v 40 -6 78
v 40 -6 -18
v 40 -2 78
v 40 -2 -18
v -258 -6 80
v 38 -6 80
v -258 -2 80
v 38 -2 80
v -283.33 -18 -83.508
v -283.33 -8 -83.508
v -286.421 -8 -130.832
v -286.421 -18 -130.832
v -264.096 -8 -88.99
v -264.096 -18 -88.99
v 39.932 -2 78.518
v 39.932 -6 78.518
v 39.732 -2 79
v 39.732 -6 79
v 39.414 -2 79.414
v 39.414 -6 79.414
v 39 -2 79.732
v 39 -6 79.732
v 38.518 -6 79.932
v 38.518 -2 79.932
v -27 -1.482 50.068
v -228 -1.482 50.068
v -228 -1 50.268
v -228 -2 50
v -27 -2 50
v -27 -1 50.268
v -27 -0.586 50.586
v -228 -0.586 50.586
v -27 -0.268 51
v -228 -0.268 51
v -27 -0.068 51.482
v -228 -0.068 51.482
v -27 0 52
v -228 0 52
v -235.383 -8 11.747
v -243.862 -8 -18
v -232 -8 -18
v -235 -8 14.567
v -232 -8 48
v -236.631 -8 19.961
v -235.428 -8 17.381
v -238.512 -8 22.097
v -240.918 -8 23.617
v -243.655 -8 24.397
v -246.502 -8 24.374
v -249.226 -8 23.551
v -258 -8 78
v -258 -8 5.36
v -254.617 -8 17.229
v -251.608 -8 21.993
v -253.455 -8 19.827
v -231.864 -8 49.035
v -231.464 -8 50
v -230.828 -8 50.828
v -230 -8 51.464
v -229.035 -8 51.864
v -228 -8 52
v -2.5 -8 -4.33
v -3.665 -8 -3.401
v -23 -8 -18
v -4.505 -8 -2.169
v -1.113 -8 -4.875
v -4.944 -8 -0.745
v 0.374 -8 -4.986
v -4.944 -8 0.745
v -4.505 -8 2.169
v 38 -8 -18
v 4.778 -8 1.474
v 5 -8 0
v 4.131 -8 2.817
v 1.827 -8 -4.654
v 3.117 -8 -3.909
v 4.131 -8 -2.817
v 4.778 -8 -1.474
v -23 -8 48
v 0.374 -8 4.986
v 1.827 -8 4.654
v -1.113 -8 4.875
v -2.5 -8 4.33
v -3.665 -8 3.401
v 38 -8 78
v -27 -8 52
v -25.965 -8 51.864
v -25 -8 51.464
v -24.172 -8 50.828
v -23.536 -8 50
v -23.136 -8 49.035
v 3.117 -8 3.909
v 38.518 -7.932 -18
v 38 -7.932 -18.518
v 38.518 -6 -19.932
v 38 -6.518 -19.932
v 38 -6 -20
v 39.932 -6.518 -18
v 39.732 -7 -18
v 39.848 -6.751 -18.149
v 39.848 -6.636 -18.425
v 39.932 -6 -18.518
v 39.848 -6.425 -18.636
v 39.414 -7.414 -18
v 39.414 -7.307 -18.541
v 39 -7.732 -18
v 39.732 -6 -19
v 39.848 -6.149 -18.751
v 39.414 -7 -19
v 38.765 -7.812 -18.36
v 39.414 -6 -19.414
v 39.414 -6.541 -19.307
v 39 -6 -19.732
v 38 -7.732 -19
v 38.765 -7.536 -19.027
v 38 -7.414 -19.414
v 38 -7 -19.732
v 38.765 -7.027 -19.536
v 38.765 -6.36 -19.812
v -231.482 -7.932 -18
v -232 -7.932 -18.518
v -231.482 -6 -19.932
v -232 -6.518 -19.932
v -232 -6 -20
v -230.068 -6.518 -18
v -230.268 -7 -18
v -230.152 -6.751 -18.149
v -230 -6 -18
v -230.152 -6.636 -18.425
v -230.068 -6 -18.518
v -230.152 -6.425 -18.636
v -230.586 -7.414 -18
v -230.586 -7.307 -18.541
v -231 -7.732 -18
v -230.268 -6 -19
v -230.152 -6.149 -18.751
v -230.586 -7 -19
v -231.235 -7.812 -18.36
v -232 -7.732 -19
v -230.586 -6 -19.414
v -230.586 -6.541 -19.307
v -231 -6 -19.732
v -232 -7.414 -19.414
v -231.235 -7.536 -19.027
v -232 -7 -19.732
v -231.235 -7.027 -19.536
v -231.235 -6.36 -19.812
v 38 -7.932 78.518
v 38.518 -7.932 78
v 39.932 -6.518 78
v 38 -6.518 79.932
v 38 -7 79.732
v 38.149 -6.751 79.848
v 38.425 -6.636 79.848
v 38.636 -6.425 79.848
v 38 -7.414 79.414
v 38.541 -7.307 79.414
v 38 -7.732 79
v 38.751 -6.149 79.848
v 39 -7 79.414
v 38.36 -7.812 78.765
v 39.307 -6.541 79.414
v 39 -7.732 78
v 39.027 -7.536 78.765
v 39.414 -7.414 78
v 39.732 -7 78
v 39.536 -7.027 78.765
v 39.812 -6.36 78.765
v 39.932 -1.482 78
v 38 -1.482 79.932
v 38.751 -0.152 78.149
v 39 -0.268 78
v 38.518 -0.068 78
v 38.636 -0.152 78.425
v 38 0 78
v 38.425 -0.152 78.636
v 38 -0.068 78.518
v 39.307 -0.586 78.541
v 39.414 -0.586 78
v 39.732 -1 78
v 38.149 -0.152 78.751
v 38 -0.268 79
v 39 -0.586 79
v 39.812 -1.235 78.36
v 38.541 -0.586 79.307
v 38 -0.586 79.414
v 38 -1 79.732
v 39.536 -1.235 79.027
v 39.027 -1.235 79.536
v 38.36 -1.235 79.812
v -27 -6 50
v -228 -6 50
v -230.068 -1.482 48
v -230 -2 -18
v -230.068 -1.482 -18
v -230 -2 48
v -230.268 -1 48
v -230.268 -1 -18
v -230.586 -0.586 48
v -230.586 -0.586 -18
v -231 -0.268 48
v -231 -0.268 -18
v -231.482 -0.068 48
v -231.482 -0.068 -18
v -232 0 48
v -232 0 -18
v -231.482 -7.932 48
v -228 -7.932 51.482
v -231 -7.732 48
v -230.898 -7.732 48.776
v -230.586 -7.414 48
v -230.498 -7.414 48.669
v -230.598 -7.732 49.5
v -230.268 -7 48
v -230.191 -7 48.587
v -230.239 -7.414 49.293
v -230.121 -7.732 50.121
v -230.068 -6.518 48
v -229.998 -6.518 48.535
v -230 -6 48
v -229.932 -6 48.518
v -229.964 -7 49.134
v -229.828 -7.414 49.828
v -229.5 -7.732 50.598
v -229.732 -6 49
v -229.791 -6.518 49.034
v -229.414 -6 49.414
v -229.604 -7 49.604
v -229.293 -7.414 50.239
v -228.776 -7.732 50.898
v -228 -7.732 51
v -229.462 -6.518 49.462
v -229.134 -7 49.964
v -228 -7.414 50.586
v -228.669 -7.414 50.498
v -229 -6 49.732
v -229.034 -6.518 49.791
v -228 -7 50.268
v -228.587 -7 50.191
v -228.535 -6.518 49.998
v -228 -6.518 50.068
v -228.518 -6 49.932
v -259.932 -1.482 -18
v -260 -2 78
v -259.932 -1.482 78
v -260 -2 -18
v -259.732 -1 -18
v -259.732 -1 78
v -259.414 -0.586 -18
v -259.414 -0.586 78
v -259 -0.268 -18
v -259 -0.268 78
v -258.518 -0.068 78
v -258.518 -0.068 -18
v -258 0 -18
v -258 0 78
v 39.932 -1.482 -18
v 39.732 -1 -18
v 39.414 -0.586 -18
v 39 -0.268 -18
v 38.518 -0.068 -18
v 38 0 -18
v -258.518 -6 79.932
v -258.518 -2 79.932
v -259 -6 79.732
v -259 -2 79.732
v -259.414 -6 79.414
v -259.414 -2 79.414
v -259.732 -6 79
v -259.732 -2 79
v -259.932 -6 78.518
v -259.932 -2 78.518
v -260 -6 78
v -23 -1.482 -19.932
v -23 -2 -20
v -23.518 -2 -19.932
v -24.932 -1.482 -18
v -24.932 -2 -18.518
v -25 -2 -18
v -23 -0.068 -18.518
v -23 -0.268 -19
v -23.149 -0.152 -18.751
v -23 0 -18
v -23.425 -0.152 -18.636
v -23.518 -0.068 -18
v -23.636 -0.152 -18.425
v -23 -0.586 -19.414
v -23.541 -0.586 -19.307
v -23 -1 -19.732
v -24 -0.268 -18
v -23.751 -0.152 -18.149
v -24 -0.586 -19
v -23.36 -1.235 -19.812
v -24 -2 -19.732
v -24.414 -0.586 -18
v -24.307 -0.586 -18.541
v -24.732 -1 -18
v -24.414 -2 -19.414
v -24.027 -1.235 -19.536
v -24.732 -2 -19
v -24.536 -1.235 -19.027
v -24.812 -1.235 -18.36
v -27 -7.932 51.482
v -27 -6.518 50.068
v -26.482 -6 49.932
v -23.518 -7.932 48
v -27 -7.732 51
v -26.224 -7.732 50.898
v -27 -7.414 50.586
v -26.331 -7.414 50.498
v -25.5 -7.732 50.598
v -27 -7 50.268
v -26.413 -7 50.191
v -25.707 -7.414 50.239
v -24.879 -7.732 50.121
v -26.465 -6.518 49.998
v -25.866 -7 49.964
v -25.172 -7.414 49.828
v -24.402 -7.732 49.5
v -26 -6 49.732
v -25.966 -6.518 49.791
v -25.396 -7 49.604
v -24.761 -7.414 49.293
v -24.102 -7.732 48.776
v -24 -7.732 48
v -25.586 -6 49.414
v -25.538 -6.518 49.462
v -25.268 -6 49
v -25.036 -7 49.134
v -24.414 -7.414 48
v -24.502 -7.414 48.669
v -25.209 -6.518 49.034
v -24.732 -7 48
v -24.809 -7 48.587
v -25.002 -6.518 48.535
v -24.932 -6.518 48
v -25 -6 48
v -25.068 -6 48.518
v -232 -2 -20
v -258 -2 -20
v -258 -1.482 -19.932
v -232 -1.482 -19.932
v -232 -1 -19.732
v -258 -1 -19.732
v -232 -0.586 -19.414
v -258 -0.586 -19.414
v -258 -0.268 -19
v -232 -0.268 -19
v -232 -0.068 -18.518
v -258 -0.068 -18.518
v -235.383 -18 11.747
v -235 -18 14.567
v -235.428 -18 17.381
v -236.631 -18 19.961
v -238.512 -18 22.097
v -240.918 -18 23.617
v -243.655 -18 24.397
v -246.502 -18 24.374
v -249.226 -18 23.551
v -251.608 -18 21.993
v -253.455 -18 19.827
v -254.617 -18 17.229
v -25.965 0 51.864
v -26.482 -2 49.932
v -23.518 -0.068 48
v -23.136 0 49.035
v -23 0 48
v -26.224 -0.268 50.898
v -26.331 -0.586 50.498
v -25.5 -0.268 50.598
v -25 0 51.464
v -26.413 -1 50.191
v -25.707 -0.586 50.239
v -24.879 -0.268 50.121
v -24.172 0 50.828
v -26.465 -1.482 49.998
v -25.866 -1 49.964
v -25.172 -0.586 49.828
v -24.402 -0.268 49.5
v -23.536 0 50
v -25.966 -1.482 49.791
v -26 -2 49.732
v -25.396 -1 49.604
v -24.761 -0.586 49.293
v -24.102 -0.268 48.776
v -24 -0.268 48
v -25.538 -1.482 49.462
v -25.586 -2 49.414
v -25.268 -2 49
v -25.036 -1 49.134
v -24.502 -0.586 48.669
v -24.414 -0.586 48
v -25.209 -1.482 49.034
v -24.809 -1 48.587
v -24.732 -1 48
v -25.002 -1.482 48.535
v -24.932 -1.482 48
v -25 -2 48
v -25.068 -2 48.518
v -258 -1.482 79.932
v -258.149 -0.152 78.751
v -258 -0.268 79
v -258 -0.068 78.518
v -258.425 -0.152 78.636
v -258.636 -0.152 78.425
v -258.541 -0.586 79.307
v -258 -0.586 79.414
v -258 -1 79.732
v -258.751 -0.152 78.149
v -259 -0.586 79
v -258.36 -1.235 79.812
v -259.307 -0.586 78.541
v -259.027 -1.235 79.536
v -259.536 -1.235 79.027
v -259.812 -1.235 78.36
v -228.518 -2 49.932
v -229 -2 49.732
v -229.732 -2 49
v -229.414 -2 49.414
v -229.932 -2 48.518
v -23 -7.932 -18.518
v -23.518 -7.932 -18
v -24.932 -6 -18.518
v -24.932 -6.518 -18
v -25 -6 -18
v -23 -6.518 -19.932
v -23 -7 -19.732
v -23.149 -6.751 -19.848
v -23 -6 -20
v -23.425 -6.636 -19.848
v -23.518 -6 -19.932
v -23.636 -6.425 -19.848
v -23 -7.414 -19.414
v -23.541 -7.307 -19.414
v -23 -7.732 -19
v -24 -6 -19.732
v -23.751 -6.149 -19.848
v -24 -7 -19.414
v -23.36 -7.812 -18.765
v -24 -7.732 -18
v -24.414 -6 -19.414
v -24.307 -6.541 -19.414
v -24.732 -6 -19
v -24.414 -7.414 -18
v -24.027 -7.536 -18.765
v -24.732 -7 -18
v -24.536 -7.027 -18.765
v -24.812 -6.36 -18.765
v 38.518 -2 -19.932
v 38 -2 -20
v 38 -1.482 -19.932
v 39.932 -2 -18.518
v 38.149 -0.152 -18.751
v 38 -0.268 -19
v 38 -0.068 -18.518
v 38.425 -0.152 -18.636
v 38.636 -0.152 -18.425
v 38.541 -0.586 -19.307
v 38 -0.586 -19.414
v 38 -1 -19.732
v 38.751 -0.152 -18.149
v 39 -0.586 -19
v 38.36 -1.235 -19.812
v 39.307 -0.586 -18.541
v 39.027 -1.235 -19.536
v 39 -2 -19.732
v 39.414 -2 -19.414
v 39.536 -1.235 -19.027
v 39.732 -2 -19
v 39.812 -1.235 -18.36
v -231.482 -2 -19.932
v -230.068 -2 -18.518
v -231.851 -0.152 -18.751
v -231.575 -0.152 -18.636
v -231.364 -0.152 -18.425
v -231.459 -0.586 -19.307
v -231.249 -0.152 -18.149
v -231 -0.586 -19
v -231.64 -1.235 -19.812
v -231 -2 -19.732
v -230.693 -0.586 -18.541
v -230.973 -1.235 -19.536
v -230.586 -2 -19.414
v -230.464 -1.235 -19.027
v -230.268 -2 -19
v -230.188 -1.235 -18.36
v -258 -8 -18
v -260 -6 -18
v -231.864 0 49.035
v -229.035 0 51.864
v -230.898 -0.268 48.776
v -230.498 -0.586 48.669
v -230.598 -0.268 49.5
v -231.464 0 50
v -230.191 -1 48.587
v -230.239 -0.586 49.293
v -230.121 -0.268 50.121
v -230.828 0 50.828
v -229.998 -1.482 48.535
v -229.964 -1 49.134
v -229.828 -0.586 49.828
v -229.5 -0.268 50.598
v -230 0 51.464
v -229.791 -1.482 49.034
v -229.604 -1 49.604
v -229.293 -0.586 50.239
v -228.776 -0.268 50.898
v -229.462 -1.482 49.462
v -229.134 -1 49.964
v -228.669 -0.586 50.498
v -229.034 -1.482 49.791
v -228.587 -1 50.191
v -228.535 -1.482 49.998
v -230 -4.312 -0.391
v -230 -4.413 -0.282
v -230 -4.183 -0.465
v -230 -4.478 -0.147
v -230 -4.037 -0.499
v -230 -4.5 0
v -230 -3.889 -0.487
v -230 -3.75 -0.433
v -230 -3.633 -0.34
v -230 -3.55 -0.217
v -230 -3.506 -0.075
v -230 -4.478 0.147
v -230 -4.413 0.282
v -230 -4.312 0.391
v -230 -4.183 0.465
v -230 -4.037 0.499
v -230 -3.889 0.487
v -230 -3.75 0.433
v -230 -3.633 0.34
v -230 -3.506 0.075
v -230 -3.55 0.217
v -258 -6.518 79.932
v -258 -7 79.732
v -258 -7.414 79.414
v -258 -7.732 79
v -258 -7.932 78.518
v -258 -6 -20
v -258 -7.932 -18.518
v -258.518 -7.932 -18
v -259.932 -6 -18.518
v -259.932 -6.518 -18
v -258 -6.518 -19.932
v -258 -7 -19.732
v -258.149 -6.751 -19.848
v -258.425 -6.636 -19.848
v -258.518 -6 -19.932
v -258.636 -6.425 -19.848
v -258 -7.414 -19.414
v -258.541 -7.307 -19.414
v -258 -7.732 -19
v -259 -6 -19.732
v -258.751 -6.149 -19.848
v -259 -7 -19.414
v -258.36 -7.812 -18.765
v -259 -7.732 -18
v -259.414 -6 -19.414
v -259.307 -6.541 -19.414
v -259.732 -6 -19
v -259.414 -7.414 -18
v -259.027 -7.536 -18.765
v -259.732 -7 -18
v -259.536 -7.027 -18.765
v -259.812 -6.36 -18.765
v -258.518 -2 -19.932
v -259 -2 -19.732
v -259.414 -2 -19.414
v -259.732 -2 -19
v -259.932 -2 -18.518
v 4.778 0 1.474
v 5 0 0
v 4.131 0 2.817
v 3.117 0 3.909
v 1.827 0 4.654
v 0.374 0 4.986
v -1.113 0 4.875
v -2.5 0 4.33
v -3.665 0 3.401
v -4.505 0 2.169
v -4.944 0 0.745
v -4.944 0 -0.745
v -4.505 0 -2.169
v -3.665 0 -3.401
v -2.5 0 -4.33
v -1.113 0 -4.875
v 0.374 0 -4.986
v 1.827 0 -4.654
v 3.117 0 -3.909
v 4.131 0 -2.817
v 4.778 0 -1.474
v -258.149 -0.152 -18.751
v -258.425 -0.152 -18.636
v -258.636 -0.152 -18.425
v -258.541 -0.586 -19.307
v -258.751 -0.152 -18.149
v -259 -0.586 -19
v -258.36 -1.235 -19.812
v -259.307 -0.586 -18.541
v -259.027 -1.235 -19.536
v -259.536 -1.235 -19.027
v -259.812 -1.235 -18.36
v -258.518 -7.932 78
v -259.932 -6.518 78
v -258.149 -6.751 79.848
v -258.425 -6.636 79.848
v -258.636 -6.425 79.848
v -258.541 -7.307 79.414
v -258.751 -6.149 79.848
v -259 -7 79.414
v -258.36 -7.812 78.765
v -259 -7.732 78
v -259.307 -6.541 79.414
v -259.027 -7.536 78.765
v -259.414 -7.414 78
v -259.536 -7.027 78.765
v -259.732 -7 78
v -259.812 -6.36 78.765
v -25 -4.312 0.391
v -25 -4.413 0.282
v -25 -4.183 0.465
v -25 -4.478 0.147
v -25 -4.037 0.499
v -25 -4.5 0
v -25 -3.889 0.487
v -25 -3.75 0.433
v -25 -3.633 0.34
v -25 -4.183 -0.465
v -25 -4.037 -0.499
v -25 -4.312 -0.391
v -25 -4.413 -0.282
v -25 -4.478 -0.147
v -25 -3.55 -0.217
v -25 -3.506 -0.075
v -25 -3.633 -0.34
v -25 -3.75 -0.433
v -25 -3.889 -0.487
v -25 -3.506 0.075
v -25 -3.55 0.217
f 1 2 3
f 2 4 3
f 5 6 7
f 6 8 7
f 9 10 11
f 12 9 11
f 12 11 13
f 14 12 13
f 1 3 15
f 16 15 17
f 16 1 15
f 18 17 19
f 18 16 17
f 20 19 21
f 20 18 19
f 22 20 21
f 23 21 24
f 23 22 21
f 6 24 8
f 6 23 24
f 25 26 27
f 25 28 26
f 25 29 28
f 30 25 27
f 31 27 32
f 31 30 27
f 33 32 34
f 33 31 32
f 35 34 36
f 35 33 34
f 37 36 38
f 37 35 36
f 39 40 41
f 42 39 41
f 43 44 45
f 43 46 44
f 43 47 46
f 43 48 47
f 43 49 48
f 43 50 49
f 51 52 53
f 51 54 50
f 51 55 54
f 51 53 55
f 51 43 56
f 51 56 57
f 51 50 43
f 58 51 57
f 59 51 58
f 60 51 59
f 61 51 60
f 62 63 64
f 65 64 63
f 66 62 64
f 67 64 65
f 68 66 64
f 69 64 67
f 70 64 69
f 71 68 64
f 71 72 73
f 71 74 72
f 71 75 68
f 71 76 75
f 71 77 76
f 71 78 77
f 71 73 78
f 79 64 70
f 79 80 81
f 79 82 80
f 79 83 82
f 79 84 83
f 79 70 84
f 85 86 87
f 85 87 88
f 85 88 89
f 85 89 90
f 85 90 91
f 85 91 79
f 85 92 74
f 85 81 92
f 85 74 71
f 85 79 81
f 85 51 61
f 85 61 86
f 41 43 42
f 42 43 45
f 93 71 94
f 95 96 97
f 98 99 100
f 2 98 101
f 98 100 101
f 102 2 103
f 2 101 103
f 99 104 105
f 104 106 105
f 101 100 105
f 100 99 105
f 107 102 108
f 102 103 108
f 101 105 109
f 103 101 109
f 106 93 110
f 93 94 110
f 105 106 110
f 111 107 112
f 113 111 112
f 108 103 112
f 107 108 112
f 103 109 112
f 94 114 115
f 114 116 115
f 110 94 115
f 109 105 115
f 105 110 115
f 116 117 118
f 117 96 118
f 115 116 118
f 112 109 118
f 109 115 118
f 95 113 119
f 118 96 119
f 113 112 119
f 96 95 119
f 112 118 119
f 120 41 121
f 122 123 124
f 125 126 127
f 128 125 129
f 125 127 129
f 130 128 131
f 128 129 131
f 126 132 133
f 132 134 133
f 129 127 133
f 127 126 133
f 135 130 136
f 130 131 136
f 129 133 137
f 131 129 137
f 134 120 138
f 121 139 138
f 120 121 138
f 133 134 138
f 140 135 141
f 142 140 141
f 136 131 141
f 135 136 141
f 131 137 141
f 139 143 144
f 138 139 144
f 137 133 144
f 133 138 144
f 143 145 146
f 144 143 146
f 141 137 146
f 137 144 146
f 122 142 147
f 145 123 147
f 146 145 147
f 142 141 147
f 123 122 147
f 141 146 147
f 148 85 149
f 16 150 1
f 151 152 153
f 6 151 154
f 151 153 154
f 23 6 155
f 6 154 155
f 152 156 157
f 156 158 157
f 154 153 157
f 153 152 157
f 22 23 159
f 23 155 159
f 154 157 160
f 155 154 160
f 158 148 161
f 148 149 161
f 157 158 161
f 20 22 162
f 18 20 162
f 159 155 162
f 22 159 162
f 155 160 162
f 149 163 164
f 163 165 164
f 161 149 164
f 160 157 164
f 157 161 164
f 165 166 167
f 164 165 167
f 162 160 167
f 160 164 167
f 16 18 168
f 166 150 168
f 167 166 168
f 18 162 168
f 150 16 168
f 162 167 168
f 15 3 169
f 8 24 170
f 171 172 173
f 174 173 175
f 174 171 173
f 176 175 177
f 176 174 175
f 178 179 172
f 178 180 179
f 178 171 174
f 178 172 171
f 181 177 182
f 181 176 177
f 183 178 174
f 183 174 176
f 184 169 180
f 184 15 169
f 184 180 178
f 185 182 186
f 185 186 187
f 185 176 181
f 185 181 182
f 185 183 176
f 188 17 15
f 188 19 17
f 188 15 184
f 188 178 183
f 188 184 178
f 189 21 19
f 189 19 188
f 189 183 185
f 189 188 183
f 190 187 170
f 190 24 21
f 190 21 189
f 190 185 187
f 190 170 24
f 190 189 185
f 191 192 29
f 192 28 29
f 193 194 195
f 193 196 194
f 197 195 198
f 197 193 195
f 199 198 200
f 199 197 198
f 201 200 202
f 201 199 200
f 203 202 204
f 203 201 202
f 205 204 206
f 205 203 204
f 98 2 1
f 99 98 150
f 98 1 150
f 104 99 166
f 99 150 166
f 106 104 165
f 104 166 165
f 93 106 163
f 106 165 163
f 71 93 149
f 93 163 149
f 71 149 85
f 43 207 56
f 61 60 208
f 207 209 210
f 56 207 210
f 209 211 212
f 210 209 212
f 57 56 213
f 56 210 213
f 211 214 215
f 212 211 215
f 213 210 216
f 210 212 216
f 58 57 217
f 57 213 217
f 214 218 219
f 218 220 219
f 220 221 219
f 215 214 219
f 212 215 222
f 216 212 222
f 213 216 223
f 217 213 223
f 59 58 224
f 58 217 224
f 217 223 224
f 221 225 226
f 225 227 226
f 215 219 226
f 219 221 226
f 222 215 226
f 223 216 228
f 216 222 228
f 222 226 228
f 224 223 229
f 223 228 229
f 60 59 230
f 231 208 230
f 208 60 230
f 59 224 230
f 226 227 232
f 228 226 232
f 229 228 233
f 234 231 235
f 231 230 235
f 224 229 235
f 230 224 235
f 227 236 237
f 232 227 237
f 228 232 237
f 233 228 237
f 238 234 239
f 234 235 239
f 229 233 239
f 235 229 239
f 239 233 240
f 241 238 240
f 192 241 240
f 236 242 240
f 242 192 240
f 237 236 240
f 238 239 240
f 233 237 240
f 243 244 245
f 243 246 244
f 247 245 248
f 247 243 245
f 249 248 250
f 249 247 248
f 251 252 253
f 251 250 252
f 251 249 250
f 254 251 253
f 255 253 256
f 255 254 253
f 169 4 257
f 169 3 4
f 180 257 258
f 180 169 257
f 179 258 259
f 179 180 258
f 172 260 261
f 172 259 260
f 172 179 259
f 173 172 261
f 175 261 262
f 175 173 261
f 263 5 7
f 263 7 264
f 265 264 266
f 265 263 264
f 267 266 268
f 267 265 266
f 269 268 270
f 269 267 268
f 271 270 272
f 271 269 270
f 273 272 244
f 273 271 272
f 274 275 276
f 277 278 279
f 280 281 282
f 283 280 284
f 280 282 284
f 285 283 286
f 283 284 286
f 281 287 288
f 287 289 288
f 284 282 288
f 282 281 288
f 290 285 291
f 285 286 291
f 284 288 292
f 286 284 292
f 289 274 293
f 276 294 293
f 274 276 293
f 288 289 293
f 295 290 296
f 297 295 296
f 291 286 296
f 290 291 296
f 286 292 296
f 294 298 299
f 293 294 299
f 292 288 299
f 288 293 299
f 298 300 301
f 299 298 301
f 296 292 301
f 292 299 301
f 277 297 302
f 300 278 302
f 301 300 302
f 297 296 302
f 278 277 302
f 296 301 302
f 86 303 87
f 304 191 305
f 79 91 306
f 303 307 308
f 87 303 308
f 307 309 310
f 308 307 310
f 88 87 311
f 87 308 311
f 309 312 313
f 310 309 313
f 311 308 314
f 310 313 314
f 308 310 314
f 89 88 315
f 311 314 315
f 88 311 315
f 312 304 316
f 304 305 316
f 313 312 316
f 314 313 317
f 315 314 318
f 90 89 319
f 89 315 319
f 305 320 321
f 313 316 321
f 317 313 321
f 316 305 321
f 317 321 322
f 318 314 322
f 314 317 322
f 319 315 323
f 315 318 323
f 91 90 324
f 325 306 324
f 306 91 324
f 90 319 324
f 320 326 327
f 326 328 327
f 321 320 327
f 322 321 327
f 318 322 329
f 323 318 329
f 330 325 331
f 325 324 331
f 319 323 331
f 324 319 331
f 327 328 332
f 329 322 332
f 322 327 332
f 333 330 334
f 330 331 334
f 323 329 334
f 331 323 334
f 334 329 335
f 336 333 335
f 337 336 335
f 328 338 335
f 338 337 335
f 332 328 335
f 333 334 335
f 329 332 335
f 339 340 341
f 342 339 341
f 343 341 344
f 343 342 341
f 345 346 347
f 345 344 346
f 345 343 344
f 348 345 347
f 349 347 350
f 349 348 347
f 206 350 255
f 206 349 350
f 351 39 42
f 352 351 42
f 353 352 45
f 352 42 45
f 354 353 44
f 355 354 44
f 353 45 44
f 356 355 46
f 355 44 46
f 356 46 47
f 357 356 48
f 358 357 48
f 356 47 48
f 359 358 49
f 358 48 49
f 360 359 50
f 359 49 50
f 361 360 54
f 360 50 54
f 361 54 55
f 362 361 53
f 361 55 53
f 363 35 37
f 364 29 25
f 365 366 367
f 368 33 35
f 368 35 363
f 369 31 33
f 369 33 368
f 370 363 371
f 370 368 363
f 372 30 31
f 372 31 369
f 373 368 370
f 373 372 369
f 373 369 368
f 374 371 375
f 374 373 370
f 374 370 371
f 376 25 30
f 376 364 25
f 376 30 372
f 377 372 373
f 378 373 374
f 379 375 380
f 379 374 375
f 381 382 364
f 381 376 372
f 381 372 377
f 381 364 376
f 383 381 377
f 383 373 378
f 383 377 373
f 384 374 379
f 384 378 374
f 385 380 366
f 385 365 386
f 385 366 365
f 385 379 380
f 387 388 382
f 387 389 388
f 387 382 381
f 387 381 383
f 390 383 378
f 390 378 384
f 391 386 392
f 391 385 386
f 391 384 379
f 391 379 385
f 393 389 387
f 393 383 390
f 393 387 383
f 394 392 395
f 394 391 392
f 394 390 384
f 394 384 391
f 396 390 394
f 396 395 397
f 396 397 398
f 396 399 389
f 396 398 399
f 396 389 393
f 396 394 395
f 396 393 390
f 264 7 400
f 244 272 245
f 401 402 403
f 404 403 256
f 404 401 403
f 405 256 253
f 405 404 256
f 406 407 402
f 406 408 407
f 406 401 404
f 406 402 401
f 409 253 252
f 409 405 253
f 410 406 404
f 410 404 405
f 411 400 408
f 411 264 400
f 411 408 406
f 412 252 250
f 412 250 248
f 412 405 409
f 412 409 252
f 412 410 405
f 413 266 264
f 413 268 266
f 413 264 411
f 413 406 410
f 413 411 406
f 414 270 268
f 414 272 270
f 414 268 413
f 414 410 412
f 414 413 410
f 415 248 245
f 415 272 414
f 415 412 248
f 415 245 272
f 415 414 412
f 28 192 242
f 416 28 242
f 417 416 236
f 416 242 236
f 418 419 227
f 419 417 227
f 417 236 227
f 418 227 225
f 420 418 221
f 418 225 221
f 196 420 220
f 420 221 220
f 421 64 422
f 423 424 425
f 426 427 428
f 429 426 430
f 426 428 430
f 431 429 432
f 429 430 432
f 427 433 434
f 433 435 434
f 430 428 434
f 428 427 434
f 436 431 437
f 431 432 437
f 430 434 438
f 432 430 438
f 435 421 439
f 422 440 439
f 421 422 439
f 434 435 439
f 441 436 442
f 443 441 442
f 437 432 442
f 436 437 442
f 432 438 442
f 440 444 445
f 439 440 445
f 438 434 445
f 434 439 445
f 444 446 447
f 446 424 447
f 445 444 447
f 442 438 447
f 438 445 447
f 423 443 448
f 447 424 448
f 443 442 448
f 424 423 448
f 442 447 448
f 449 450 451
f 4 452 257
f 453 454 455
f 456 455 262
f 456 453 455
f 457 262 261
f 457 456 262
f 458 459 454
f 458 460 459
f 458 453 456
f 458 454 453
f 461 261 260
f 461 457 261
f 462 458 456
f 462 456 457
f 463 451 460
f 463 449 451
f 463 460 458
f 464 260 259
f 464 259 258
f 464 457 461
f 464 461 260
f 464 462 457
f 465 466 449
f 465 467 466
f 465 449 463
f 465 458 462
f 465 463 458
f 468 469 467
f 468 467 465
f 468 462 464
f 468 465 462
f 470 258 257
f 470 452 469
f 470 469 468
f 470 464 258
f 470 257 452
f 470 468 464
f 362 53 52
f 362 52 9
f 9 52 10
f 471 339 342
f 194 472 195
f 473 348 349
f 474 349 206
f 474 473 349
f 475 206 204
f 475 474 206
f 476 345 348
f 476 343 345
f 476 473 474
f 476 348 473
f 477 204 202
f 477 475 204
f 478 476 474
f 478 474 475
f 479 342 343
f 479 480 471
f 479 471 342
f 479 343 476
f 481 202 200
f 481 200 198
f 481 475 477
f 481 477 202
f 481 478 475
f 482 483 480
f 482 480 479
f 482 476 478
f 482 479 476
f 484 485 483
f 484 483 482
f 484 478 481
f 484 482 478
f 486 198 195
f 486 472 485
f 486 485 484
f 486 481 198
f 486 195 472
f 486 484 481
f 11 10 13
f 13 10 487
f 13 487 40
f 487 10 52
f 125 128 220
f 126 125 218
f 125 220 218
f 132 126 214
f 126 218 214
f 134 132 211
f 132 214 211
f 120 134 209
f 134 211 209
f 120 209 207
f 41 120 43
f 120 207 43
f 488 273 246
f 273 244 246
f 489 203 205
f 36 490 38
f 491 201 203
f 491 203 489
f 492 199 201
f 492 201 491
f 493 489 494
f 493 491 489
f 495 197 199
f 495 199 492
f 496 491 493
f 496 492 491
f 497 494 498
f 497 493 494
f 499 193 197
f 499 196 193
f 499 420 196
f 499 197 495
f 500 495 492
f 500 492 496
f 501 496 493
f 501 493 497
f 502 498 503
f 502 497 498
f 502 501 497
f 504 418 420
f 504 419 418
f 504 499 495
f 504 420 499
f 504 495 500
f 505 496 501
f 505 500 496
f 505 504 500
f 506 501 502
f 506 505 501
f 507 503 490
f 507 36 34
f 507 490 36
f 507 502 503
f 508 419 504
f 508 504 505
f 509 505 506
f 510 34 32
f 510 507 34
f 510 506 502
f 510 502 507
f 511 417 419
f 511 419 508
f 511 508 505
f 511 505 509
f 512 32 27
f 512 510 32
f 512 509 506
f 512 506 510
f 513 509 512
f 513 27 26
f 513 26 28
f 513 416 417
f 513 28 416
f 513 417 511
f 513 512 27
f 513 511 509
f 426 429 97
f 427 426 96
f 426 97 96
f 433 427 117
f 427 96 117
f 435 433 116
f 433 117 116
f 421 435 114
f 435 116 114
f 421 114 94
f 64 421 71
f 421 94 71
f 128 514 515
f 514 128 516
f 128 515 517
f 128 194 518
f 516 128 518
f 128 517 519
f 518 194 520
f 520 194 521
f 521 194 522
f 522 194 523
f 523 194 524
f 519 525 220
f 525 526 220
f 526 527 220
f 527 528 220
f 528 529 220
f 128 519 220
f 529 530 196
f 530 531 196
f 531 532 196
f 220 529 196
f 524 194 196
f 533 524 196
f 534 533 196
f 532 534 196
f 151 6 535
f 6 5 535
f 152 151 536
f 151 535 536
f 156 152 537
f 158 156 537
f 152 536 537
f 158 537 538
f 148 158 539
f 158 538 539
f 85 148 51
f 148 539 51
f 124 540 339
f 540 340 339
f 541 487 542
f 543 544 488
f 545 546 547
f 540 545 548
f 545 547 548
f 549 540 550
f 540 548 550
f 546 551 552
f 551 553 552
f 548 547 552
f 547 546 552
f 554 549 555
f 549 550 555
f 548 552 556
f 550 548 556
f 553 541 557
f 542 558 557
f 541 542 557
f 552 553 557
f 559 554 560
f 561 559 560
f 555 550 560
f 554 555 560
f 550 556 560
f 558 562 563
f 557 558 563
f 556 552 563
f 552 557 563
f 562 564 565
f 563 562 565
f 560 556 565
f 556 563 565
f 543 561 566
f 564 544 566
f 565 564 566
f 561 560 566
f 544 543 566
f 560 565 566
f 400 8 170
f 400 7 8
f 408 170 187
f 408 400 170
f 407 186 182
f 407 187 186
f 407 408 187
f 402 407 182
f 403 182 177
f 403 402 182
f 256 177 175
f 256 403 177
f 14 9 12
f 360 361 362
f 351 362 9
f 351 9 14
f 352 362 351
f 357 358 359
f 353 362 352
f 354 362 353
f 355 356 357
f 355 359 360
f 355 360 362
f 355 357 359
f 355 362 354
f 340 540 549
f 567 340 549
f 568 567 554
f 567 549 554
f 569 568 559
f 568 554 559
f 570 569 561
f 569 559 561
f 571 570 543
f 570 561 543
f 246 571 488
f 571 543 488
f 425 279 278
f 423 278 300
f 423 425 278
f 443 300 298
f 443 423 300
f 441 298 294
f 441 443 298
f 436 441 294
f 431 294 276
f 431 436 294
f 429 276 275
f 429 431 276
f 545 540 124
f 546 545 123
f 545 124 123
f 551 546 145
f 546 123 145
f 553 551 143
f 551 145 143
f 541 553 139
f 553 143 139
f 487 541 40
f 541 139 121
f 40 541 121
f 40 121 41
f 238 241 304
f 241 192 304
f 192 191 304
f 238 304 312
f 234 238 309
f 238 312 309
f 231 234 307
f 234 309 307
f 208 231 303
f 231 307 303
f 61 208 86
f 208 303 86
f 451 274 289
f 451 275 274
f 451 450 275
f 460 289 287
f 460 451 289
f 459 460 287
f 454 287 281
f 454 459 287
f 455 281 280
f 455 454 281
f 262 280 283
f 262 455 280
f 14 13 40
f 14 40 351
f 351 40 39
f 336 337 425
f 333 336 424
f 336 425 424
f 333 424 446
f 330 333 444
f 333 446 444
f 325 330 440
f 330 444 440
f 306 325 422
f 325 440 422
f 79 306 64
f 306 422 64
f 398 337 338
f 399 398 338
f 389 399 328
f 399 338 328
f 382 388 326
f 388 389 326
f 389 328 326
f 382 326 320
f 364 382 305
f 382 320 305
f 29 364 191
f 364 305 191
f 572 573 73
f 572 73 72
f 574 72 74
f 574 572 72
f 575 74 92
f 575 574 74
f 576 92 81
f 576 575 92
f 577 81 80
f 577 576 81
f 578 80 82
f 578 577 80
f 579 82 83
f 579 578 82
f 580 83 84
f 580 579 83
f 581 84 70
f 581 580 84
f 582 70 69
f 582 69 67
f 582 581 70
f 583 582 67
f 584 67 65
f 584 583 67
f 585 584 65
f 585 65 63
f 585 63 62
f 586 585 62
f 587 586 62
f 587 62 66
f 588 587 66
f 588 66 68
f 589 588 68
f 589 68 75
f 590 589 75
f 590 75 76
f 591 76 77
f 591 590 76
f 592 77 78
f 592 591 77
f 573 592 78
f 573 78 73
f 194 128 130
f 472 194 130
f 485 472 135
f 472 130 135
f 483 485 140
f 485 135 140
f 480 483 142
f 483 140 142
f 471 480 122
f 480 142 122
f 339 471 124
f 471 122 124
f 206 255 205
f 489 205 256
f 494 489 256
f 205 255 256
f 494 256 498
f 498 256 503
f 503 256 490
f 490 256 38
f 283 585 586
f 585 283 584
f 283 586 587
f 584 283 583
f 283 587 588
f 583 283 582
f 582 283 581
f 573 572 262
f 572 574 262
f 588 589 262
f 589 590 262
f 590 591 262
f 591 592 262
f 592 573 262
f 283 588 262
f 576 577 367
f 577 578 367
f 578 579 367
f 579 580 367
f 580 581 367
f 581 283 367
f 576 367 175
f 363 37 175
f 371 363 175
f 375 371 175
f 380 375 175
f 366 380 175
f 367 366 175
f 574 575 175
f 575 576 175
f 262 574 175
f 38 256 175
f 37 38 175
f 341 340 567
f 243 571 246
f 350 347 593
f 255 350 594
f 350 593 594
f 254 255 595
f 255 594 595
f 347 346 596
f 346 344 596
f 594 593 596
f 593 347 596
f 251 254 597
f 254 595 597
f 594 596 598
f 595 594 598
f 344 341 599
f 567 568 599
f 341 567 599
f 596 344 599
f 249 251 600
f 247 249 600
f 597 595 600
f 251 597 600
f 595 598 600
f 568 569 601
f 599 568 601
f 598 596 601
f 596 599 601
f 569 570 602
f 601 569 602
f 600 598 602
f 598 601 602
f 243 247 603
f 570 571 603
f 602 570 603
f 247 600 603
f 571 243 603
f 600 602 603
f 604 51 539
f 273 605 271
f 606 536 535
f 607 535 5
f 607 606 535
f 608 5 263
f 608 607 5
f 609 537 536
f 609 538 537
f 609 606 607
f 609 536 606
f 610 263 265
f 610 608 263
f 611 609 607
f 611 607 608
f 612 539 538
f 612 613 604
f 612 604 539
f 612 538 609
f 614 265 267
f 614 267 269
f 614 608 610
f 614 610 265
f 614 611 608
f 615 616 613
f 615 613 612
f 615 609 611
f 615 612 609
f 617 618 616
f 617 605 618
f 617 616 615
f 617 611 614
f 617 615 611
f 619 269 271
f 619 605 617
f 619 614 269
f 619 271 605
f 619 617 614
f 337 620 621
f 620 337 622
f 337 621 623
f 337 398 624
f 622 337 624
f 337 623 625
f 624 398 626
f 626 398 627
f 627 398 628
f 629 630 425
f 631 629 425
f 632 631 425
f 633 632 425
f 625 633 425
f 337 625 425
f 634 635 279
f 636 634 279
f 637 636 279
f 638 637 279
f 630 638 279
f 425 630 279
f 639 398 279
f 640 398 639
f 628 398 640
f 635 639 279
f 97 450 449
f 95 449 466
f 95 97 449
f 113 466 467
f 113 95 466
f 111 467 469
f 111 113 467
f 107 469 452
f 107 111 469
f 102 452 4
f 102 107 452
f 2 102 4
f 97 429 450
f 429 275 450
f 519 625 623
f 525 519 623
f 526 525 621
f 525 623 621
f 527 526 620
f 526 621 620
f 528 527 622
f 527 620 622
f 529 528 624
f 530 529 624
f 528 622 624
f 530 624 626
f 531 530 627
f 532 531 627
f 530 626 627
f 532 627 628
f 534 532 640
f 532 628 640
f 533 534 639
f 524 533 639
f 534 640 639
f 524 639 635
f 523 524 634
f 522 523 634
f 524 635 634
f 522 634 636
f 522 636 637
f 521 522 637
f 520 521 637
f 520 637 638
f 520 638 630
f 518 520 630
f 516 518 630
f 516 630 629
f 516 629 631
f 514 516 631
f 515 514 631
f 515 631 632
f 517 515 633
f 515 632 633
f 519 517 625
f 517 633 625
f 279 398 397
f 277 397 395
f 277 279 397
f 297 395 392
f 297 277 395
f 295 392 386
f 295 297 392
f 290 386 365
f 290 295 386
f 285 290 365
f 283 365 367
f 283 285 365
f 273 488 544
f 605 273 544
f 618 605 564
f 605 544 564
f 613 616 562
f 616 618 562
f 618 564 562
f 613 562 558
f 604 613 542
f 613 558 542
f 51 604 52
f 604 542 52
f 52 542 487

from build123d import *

# Parameters (mm, degrees)
F0_R     = 5
F1_DEPTH = 8
F2_R     = 2
F3_R     = 0.5
F4_DEPTH = 205
F6_DEPTH = 10


with BuildPart() as f1:
    # F0 (on Front) → F1 (new body)
    with BuildSketch(Plane.XZ):
        Polygon((-25, 50), (-25, -20), (40, -20), (40, 80), (-260, 80), (-260, -20), (-230, -20), (-230, 50), align=None)
        Circle(F0_R, mode=Mode.SUBTRACT)
    extrude(amount=F1_DEPTH)

    # F2
    f2_edges = [f1.edges().sort_by_distance(p)[0] for p in [
        (-260, -8, 30),
        (-245, -8, -20),
        (-230, -8, 15),
        (-127.5, -8, 50),
        (-25, -8, 15),
        (7.5, -8, -20),
        (40, -8, 30),
        (-110, -8, 80),
        (-260, -4, 80),
        (-260, -4, -20),
        (40, -4, 80),
        (40, -4, -20),
        (-25, -4, -20),
        (-25, -4, 50),
        (-230, -4, 50),
        (-230, -4, -20),
        (-245, 0, -20),
        (-230, 0, 15),
        (-127.5, 0, 50),
        (7.5, 0, -20),
        (40, 0, 30),
        (-110, 0, 80),
        (-260, 0, 30),
        (-25, 0, 15),
    ]]
    fillet(f2_edges, radius=F2_R)

    # F3 (on face) → F4 (join, through all)
    with BuildSketch(Plane(origin=(-25, 0, 0), x_dir=(0, -1, 0), z_dir=(-1, 0, 0))):
        with Locations((4, 0)):
            Circle(F3_R)
    extrude(amount=F4_DEPTH)

    # F5 (on face) → F6 (join)
    with BuildSketch(Plane.XZ.offset(8)):
        with BuildLine():
            ThreePointArc((-235.3830339919, 11.7465816491), (-242.2588387865, 24.1047088707), (-254.6169660081, 17.2289040761))
            Line((-254.6169660081, 17.2289040761), (-283.3303219183, -83.5077349835))
            Line((-283.3303219183, -83.5077349835), (-286.420911747, -130.8315102833))
            Line((-286.420911747, -130.8315102833), (-264.096389902, -88.9900574105))
            Line((-264.096389902, -88.9900574105), (-235.3830339919, 11.7465816491))
        make_face()
    extrude(amount=F6_DEPTH)


solid = f1.part
